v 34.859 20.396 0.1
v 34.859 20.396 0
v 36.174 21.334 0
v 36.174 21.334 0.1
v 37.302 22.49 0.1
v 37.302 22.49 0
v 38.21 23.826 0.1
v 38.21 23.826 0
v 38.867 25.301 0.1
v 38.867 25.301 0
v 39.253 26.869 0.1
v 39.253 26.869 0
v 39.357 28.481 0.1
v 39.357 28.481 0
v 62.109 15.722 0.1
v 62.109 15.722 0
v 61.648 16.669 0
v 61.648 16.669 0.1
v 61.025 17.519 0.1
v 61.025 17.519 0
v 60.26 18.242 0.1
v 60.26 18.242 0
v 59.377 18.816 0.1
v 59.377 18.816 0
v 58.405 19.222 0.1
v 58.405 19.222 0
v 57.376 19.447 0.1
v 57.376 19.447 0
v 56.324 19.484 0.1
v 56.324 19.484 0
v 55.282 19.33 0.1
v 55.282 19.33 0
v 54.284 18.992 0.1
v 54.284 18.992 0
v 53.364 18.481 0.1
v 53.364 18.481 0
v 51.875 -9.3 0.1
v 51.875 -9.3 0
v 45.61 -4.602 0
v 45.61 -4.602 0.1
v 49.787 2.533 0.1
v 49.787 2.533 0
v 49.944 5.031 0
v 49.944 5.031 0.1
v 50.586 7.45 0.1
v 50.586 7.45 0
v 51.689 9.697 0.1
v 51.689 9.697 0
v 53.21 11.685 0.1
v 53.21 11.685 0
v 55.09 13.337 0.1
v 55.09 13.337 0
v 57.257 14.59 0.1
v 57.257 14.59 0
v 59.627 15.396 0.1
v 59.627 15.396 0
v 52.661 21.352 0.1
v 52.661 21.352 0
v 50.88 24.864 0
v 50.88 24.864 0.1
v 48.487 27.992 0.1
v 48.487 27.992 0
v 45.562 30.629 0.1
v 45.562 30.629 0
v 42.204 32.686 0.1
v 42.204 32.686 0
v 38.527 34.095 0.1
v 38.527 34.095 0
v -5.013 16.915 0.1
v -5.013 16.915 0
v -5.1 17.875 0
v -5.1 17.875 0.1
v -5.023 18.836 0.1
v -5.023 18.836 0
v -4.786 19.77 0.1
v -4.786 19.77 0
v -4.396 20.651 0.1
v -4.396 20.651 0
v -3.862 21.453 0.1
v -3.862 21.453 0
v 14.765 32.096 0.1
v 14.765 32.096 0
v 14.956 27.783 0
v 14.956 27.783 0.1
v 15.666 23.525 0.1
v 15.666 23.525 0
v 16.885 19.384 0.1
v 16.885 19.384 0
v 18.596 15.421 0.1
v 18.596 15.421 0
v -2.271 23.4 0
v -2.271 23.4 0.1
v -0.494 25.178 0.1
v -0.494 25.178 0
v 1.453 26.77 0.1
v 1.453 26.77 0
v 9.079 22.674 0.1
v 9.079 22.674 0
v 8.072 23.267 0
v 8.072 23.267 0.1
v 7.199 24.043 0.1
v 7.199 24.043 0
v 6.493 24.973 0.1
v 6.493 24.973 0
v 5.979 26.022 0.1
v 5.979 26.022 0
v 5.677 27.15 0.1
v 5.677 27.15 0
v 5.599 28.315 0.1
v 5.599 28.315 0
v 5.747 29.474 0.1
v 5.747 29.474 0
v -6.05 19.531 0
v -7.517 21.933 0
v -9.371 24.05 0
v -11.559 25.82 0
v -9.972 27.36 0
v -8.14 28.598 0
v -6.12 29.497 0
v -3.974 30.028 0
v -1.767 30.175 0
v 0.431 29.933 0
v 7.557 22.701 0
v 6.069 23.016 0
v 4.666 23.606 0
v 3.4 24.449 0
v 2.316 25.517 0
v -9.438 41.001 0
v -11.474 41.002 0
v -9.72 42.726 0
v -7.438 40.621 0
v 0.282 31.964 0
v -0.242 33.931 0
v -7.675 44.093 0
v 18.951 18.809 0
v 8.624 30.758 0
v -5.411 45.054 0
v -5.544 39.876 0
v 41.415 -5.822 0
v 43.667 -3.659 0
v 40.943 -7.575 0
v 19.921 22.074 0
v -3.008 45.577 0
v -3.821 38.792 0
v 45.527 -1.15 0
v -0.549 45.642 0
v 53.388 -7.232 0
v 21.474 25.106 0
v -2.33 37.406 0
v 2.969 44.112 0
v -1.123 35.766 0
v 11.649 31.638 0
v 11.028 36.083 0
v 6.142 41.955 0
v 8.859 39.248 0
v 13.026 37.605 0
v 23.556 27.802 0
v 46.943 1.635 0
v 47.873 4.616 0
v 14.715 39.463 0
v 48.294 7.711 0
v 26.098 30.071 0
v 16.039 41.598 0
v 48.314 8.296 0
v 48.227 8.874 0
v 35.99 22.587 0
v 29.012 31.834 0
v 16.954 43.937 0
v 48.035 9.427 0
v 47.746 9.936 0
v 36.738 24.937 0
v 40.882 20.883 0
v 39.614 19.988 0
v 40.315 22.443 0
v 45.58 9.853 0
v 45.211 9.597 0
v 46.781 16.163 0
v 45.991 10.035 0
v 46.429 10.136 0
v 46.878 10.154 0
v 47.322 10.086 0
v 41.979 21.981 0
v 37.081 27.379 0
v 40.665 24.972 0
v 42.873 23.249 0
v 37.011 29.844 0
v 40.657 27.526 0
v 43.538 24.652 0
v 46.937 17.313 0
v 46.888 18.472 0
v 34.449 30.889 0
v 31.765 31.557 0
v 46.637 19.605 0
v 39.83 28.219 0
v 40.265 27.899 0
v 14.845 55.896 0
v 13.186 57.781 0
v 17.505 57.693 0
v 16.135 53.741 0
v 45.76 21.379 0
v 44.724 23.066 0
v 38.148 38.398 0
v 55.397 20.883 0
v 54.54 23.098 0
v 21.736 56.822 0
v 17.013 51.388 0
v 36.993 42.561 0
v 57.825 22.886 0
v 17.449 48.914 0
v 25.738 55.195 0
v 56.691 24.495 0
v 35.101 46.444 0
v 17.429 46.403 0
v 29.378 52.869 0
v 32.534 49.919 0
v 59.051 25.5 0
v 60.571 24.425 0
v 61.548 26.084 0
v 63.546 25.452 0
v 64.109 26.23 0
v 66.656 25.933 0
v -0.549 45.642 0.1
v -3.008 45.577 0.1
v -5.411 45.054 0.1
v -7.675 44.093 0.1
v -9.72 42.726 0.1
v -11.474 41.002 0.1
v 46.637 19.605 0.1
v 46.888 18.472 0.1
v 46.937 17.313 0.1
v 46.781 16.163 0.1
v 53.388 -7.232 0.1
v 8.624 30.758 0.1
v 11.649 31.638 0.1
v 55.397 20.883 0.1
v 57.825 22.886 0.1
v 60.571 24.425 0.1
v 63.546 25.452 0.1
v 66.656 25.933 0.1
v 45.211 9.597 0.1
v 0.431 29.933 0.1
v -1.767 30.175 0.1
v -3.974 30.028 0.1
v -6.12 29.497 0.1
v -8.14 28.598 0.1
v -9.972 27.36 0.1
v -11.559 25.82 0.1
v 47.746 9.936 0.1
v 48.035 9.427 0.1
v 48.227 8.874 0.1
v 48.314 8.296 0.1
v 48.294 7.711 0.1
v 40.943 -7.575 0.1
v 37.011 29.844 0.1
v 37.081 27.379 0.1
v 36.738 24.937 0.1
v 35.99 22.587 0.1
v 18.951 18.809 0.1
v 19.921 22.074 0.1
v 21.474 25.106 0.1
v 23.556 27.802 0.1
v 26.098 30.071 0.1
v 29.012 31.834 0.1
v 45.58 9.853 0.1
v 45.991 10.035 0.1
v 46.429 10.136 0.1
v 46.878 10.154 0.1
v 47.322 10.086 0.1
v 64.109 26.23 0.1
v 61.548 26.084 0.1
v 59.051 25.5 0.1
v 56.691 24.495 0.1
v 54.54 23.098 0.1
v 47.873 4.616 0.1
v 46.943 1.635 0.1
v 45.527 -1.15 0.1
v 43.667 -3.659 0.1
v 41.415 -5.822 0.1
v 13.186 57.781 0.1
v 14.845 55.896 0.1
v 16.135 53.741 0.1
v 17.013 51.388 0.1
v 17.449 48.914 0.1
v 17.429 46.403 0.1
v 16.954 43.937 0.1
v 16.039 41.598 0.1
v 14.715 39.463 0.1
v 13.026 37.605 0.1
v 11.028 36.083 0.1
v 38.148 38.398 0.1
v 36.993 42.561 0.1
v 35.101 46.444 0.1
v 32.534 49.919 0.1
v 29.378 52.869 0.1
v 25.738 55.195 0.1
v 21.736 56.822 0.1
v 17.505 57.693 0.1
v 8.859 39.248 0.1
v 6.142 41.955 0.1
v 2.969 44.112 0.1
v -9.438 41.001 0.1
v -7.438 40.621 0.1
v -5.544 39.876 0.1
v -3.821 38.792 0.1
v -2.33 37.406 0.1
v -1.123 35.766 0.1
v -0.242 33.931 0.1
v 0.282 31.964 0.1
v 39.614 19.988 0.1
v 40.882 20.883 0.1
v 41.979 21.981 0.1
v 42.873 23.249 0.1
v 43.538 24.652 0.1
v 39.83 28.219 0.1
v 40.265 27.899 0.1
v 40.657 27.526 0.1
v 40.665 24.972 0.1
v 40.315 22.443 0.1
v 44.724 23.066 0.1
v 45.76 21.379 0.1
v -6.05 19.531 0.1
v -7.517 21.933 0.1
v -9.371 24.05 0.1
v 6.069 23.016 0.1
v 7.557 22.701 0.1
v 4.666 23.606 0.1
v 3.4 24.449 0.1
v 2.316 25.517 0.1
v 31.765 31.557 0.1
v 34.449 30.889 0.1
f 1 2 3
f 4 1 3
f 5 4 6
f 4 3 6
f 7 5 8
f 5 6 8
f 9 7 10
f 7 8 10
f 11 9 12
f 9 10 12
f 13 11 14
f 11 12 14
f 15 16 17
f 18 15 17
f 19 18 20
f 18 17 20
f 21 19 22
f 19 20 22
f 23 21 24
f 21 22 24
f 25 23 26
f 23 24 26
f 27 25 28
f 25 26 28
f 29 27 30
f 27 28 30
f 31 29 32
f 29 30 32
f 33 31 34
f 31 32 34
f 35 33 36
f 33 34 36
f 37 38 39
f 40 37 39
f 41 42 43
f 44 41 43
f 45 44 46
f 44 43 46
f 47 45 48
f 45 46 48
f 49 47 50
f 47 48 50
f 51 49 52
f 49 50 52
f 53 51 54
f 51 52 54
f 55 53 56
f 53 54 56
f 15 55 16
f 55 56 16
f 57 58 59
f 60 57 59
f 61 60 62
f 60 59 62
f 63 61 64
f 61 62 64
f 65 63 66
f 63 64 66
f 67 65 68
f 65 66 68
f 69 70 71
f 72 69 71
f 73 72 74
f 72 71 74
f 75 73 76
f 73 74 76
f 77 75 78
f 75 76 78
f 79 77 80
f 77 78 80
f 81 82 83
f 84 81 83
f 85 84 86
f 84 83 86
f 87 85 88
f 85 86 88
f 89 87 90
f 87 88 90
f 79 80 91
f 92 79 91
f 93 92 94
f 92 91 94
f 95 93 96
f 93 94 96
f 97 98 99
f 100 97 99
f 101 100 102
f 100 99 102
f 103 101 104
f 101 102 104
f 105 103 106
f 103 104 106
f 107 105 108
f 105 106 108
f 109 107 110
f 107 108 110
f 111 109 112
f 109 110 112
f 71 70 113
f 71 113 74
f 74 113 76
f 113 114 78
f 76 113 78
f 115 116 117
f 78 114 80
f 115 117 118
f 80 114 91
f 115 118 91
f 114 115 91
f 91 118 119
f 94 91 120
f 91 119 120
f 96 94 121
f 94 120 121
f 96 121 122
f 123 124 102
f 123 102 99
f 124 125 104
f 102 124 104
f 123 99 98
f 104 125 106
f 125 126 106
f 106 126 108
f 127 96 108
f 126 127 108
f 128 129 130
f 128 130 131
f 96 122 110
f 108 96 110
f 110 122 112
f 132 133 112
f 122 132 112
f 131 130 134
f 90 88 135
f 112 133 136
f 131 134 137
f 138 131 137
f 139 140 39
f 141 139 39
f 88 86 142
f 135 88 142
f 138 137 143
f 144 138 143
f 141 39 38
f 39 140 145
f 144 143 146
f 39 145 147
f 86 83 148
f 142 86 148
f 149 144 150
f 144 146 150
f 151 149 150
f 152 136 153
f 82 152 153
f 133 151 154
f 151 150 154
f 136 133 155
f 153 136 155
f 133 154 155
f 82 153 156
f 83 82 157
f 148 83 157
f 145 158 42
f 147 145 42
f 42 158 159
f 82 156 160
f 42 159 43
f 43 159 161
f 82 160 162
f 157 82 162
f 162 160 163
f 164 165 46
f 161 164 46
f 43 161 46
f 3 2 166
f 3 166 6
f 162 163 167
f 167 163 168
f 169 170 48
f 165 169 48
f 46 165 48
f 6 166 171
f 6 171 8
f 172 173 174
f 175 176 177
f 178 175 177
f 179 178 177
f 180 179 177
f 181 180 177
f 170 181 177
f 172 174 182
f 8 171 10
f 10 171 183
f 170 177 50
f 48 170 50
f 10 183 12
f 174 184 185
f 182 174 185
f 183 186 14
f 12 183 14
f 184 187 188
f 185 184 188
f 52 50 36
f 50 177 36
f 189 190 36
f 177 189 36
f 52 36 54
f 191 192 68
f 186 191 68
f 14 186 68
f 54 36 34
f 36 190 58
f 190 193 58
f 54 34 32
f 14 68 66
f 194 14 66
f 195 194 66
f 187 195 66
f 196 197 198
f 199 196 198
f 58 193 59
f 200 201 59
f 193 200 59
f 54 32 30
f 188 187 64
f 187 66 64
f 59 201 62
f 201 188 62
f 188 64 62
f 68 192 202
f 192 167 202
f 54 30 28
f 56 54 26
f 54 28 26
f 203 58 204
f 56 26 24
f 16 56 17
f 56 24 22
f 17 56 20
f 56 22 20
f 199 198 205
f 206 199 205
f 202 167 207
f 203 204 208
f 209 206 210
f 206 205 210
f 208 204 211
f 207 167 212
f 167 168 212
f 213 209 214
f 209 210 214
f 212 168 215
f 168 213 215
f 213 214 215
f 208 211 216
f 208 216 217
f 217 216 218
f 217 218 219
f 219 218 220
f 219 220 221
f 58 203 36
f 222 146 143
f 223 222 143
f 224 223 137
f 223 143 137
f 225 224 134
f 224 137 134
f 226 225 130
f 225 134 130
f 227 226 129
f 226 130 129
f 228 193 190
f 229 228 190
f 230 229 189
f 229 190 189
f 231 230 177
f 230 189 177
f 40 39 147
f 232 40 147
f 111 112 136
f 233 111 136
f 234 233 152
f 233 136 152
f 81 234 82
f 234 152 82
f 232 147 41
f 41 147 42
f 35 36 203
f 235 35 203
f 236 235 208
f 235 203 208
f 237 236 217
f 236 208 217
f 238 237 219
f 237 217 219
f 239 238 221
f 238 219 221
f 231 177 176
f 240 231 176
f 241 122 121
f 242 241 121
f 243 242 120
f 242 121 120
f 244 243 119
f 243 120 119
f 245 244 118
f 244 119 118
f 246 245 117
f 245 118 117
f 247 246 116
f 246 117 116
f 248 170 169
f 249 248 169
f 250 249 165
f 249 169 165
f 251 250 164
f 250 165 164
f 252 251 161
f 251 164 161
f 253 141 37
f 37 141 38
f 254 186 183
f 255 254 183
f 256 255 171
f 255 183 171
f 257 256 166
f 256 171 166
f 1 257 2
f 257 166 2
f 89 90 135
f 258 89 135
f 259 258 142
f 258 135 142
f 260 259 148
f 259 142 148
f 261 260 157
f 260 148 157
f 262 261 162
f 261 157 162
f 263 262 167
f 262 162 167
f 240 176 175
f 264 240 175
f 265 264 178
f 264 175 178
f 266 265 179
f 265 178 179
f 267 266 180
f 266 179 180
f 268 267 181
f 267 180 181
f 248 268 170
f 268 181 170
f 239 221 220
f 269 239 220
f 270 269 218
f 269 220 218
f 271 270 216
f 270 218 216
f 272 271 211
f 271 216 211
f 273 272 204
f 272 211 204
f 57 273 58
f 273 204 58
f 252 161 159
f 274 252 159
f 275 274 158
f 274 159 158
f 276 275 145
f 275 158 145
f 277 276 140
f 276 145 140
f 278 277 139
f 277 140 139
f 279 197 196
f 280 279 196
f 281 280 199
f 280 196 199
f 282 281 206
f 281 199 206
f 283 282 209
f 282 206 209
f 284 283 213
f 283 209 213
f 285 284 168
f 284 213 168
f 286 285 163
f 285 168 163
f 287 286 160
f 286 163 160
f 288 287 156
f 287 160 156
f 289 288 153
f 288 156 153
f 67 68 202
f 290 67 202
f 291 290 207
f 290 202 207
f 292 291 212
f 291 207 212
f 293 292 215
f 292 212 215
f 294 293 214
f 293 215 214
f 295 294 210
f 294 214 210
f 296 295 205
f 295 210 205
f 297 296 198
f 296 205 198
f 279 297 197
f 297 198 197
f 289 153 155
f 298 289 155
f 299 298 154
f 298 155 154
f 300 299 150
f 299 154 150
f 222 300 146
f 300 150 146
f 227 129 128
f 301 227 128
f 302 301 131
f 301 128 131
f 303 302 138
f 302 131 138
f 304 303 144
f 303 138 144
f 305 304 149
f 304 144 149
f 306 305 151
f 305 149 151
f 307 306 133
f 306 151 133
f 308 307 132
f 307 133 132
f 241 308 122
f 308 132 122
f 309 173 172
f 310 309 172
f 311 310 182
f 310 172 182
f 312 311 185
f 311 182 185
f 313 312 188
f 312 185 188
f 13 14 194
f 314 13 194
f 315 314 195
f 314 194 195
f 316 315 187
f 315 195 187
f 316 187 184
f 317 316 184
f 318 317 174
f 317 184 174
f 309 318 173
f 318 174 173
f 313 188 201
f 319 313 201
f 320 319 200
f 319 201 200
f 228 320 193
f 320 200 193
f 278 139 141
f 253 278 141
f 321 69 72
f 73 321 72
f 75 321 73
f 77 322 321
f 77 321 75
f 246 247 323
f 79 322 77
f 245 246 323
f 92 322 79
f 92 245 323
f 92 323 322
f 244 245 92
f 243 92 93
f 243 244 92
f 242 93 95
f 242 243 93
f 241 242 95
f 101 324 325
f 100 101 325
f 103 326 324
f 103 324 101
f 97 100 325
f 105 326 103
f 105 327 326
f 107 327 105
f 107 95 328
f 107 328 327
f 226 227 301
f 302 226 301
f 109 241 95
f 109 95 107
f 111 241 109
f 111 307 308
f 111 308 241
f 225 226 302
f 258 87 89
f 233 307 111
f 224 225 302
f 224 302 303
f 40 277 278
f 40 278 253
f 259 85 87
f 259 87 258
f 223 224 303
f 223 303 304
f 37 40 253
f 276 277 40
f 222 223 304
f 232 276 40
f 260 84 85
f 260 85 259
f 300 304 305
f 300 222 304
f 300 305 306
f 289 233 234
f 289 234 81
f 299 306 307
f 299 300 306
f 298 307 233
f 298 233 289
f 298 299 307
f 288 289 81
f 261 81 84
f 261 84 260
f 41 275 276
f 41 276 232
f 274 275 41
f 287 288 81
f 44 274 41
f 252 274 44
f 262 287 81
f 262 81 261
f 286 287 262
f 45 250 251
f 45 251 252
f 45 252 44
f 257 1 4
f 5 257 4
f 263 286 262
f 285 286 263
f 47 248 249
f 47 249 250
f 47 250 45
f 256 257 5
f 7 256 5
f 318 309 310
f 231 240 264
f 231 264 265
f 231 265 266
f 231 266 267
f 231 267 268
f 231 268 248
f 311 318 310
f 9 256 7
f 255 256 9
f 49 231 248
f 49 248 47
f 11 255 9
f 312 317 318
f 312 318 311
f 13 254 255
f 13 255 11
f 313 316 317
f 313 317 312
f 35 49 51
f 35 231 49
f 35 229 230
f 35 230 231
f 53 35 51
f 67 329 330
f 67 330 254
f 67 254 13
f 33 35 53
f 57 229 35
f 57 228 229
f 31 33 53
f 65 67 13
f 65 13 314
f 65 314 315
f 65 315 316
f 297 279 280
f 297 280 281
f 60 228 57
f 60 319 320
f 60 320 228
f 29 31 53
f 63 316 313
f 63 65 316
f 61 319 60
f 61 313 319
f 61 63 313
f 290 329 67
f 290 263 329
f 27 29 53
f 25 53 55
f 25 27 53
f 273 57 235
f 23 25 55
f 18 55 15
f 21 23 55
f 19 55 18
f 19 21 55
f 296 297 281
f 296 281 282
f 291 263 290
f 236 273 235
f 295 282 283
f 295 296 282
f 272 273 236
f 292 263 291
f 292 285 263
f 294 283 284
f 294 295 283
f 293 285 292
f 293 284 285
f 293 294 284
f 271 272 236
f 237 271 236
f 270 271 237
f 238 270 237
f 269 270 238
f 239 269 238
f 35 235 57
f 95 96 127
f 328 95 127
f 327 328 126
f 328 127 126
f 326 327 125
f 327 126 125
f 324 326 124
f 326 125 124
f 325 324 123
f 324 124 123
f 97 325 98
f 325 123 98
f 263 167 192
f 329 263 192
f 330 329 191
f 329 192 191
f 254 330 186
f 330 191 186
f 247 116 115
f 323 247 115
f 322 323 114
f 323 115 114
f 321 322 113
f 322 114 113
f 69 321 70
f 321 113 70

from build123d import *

# Parameters (mm, degrees)
SALIENTE_EXTRUIR1_DEPTH = 0.1


with BuildPart() as part:
    # Model → Saliente-Extruir1 (new body)
    with BuildSketch(Plane.XY):
        with BuildLine():
            Line((46.781292642, 16.163412143), (45.210633071, 9.597207197))
            ThreePointArc((45.210633071, 9.597207197), (46.428733439, 10.136393874), (47.745640238, 9.935776663))
            ThreePointArc((47.745640238, 9.935776663), (48.227185328, 8.874486831), (48.29361035, 7.710953635))
            ThreePointArc((48.29361035, 7.710953635), (46.29339053, 0.212855495), (41.414561099, -5.821991516))
            Line((41.414561099, -5.821991516), (40.94311821, -7.574533899))
            Line((40.94311821, -7.574533899), (51.874825524, -9.299930098))
            Line((51.874825524, -9.299930098), (45.610263372, -4.601508484))
            Line((45.610263372, -4.601508484), (53.387805188, -7.231700789))
            Line((53.387805188, -7.231700789), (49.78663814, 2.533131744))
            ThreePointArc((49.78663814, 2.533131744), (53.21025646, 11.68516332), (62.108805747, 15.722076119))
            ThreePointArc((62.108805747, 15.722076119), (58.405273393, 19.222364472), (53.363625788, 18.480771672))
            ThreePointArc((53.363625788, 18.480771672), (59.163542766, 23.716796233), (66.656485293, 25.932829273))
            ThreePointArc((66.656485293, 25.932829273), (59.050669494, 25.500073296), (52.661184456, 21.351556375))
            ThreePointArc((52.661184456, 21.351556375), (47.085279202, 29.377399858), (38.526658627, 34.094909461))
            ThreePointArc((38.526658627, 34.094909461), (31.0230825, 51.465775367), (13.185822242, 57.781057111))
            ThreePointArc((13.185822242, 57.781057111), (17.428790822, 46.402823396), (11.027622368, 36.083325964))
            ThreePointArc((11.027622368, 36.083325964), (6.141614269, 41.955490113), (-0.549240207, 45.641660661))
            ThreePointArc((-0.549240207, 45.641660661), (-6.565835805, 44.626508675), (-11.474115224, 41.001767403))
            ThreePointArc((-11.474115224, 41.001767403), (-3.043112078, 38.133520464), (0.430717912, 29.933449747))
            ThreePointArc((0.430717912, 29.933449747), (-6.1199859, 29.496958972), (-11.558821293, 25.819825005))
            ThreePointArc((-11.558821293, 25.819825005), (-7.516746047, 21.932992962), (-5.013290934, 16.915169916))
            ThreePointArc((-5.013290934, 16.915169916), (-4.924563846, 19.307742761), (-3.862473188, 21.453492221))
            ThreePointArc((-3.862473188, 21.453492221), (-1.404763761, 24.311648506), (1.453102003, 26.769695749))
            ThreePointArc((1.453102003, 26.769695749), (4.666243247, 23.605511541), (9.078509713, 22.673715965))
            ThreePointArc((9.078509713, 22.673715965), (6.210508457, 25.484631427), (5.747363145, 29.473637989))
            ThreePointArc((5.747363145, 29.473637989), (10.121021769, 31.249866453), (14.765165078, 32.095922149))
            ThreePointArc((14.765165078, 32.095922149), (15.665979392, 23.525430747), (18.59573809, 15.421030506))
            ThreePointArc((18.59573809, 15.421030506), (21.47392467, 25.106483656), (29.012326443, 31.834370355))
            ThreePointArc((29.012326443, 31.834370355), (33.11905298, 31.270823266), (37.01078738, 29.843521077))
            ThreePointArc((37.01078738, 29.843521077), (36.737947796, 24.937066035), (34.858893184, 20.396482781))
            ThreePointArc((34.858893184, 20.396482781), (38.209567477, 23.825829531), (39.356591195, 28.481124787))
            ThreePointArc((39.356591195, 28.481124787), (40.05251455, 28.065666009), (40.657061832, 27.525816125))
            ThreePointArc((40.657061832, 27.525816125), (40.534478216, 23.70157311), (39.613613517, 19.987832464))
            ThreePointArc((39.613613517, 19.987832464), (41.978685113, 21.980935805), (43.538467404, 24.651722914))
            ThreePointArc((43.538467404, 24.651722914), (45.261167282, 22.234594253), (46.637218774, 19.604634534))
            ThreePointArc((46.637218774, 19.604634534), (46.937945055, 17.893597889), (46.781292642, 16.163412143))
        make_face()
    extrude(amount=SALIENTE_EXTRUIR1_DEPTH)


solid = part.part
